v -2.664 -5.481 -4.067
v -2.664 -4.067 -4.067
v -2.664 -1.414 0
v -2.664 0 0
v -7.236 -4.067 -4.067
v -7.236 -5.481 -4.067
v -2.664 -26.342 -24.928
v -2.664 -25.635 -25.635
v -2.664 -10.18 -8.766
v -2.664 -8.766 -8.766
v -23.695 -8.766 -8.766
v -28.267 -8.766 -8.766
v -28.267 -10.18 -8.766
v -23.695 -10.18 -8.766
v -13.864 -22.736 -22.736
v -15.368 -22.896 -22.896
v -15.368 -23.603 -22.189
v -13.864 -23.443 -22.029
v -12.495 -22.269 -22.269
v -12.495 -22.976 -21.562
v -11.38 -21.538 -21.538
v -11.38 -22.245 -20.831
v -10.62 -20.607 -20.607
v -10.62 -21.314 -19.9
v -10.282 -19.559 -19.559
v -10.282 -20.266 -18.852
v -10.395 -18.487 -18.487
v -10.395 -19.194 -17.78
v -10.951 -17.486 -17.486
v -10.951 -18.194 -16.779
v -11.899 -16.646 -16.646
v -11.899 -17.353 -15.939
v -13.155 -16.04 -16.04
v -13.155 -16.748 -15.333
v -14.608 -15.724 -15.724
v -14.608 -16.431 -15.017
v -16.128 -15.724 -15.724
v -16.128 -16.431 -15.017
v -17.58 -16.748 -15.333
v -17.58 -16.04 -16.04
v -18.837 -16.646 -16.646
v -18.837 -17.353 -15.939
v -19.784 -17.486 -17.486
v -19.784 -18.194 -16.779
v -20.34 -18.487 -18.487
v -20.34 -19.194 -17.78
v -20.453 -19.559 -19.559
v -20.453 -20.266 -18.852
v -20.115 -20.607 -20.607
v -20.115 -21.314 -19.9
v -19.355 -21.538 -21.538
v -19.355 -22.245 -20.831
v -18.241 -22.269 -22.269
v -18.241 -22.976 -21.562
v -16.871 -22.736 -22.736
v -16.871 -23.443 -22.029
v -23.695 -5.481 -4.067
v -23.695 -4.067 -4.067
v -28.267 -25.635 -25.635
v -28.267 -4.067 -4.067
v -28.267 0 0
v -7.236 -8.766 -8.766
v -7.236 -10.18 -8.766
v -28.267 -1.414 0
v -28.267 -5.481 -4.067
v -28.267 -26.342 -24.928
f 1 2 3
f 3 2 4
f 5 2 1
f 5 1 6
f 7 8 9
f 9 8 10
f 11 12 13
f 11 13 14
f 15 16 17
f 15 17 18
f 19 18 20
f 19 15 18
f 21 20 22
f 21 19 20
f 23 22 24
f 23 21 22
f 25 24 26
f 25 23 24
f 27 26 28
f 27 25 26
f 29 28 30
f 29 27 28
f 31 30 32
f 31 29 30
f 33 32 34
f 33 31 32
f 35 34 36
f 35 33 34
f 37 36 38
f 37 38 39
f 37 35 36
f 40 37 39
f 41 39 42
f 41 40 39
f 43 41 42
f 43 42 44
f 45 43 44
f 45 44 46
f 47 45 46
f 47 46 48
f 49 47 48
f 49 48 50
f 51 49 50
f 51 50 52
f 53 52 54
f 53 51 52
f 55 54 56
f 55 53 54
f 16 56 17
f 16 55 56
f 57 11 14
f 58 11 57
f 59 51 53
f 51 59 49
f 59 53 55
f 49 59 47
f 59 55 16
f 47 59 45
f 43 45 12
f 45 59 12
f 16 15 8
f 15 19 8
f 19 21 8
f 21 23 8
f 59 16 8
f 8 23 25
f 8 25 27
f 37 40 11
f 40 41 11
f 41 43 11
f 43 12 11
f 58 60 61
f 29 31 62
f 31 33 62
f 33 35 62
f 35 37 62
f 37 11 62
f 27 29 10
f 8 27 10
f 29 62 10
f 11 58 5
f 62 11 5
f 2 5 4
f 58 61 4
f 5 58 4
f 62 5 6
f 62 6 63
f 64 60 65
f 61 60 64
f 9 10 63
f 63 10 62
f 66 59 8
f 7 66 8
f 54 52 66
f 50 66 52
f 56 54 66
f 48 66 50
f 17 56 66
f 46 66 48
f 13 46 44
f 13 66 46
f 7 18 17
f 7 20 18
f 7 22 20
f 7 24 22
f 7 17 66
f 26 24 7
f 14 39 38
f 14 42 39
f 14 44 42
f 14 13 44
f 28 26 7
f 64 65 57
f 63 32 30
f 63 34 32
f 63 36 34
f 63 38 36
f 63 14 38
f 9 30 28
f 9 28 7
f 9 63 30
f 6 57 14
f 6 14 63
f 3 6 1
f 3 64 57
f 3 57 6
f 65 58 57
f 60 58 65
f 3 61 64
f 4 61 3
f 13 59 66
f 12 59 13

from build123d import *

# Parameters (mm, degrees)
SKETCH1_W           = 25.6032
SKETCH1_H           = 36.25342
SKETCH1_R           = 5.1
BOSS_EXTRUDE1_DEPTH = 1
CUT_EXTRUDE1_DEPTH  = 50.8


with BuildPart() as part:
    # Sketch1 → Boss-Extrude1 (new body)
    with BuildSketch(Plane(origin=(0, 0, 0), x_dir=(1, 0, 0), z_dir=(0, -0.7071067811865488, 0.7071067811865464))):
        with Locations((-15.465234019, -18.12671)):
            Rectangle(SKETCH1_W, SKETCH1_H)
        with Locations((-15.367622747, -27.2796)):
            Circle(SKETCH1_R, mode=Mode.SUBTRACT)
    extrude(amount=BOSS_EXTRUDE1_DEPTH)

    # Sketch2 → Cut-Extrude1 (cut)
    with BuildSketch(Plane(origin=(0, 0, 0), x_dir=(1, 0, 0), z_dir=(0, 1, 0))):
        Polygon((-2.663634019, 0), (-2.663634019, 4.06654), (-7.235634019, 4.06654), (-7.235634019, 8.76554), (-2.663634019, 8.76554), (3.686238972, 8.76554), (3.686238972, -11.022964716), (-35.05379443, -11.022964716), (-35.05379443, 8.76554), (-23.694834019, 8.76554), (-23.694834019, 4.06654), (-28.266834019, 4.06654), (-28.266834019, 0), align=None)
    extrude(amount=-CUT_EXTRUDE1_DEPTH, mode=Mode.SUBTRACT)


solid = part.part
